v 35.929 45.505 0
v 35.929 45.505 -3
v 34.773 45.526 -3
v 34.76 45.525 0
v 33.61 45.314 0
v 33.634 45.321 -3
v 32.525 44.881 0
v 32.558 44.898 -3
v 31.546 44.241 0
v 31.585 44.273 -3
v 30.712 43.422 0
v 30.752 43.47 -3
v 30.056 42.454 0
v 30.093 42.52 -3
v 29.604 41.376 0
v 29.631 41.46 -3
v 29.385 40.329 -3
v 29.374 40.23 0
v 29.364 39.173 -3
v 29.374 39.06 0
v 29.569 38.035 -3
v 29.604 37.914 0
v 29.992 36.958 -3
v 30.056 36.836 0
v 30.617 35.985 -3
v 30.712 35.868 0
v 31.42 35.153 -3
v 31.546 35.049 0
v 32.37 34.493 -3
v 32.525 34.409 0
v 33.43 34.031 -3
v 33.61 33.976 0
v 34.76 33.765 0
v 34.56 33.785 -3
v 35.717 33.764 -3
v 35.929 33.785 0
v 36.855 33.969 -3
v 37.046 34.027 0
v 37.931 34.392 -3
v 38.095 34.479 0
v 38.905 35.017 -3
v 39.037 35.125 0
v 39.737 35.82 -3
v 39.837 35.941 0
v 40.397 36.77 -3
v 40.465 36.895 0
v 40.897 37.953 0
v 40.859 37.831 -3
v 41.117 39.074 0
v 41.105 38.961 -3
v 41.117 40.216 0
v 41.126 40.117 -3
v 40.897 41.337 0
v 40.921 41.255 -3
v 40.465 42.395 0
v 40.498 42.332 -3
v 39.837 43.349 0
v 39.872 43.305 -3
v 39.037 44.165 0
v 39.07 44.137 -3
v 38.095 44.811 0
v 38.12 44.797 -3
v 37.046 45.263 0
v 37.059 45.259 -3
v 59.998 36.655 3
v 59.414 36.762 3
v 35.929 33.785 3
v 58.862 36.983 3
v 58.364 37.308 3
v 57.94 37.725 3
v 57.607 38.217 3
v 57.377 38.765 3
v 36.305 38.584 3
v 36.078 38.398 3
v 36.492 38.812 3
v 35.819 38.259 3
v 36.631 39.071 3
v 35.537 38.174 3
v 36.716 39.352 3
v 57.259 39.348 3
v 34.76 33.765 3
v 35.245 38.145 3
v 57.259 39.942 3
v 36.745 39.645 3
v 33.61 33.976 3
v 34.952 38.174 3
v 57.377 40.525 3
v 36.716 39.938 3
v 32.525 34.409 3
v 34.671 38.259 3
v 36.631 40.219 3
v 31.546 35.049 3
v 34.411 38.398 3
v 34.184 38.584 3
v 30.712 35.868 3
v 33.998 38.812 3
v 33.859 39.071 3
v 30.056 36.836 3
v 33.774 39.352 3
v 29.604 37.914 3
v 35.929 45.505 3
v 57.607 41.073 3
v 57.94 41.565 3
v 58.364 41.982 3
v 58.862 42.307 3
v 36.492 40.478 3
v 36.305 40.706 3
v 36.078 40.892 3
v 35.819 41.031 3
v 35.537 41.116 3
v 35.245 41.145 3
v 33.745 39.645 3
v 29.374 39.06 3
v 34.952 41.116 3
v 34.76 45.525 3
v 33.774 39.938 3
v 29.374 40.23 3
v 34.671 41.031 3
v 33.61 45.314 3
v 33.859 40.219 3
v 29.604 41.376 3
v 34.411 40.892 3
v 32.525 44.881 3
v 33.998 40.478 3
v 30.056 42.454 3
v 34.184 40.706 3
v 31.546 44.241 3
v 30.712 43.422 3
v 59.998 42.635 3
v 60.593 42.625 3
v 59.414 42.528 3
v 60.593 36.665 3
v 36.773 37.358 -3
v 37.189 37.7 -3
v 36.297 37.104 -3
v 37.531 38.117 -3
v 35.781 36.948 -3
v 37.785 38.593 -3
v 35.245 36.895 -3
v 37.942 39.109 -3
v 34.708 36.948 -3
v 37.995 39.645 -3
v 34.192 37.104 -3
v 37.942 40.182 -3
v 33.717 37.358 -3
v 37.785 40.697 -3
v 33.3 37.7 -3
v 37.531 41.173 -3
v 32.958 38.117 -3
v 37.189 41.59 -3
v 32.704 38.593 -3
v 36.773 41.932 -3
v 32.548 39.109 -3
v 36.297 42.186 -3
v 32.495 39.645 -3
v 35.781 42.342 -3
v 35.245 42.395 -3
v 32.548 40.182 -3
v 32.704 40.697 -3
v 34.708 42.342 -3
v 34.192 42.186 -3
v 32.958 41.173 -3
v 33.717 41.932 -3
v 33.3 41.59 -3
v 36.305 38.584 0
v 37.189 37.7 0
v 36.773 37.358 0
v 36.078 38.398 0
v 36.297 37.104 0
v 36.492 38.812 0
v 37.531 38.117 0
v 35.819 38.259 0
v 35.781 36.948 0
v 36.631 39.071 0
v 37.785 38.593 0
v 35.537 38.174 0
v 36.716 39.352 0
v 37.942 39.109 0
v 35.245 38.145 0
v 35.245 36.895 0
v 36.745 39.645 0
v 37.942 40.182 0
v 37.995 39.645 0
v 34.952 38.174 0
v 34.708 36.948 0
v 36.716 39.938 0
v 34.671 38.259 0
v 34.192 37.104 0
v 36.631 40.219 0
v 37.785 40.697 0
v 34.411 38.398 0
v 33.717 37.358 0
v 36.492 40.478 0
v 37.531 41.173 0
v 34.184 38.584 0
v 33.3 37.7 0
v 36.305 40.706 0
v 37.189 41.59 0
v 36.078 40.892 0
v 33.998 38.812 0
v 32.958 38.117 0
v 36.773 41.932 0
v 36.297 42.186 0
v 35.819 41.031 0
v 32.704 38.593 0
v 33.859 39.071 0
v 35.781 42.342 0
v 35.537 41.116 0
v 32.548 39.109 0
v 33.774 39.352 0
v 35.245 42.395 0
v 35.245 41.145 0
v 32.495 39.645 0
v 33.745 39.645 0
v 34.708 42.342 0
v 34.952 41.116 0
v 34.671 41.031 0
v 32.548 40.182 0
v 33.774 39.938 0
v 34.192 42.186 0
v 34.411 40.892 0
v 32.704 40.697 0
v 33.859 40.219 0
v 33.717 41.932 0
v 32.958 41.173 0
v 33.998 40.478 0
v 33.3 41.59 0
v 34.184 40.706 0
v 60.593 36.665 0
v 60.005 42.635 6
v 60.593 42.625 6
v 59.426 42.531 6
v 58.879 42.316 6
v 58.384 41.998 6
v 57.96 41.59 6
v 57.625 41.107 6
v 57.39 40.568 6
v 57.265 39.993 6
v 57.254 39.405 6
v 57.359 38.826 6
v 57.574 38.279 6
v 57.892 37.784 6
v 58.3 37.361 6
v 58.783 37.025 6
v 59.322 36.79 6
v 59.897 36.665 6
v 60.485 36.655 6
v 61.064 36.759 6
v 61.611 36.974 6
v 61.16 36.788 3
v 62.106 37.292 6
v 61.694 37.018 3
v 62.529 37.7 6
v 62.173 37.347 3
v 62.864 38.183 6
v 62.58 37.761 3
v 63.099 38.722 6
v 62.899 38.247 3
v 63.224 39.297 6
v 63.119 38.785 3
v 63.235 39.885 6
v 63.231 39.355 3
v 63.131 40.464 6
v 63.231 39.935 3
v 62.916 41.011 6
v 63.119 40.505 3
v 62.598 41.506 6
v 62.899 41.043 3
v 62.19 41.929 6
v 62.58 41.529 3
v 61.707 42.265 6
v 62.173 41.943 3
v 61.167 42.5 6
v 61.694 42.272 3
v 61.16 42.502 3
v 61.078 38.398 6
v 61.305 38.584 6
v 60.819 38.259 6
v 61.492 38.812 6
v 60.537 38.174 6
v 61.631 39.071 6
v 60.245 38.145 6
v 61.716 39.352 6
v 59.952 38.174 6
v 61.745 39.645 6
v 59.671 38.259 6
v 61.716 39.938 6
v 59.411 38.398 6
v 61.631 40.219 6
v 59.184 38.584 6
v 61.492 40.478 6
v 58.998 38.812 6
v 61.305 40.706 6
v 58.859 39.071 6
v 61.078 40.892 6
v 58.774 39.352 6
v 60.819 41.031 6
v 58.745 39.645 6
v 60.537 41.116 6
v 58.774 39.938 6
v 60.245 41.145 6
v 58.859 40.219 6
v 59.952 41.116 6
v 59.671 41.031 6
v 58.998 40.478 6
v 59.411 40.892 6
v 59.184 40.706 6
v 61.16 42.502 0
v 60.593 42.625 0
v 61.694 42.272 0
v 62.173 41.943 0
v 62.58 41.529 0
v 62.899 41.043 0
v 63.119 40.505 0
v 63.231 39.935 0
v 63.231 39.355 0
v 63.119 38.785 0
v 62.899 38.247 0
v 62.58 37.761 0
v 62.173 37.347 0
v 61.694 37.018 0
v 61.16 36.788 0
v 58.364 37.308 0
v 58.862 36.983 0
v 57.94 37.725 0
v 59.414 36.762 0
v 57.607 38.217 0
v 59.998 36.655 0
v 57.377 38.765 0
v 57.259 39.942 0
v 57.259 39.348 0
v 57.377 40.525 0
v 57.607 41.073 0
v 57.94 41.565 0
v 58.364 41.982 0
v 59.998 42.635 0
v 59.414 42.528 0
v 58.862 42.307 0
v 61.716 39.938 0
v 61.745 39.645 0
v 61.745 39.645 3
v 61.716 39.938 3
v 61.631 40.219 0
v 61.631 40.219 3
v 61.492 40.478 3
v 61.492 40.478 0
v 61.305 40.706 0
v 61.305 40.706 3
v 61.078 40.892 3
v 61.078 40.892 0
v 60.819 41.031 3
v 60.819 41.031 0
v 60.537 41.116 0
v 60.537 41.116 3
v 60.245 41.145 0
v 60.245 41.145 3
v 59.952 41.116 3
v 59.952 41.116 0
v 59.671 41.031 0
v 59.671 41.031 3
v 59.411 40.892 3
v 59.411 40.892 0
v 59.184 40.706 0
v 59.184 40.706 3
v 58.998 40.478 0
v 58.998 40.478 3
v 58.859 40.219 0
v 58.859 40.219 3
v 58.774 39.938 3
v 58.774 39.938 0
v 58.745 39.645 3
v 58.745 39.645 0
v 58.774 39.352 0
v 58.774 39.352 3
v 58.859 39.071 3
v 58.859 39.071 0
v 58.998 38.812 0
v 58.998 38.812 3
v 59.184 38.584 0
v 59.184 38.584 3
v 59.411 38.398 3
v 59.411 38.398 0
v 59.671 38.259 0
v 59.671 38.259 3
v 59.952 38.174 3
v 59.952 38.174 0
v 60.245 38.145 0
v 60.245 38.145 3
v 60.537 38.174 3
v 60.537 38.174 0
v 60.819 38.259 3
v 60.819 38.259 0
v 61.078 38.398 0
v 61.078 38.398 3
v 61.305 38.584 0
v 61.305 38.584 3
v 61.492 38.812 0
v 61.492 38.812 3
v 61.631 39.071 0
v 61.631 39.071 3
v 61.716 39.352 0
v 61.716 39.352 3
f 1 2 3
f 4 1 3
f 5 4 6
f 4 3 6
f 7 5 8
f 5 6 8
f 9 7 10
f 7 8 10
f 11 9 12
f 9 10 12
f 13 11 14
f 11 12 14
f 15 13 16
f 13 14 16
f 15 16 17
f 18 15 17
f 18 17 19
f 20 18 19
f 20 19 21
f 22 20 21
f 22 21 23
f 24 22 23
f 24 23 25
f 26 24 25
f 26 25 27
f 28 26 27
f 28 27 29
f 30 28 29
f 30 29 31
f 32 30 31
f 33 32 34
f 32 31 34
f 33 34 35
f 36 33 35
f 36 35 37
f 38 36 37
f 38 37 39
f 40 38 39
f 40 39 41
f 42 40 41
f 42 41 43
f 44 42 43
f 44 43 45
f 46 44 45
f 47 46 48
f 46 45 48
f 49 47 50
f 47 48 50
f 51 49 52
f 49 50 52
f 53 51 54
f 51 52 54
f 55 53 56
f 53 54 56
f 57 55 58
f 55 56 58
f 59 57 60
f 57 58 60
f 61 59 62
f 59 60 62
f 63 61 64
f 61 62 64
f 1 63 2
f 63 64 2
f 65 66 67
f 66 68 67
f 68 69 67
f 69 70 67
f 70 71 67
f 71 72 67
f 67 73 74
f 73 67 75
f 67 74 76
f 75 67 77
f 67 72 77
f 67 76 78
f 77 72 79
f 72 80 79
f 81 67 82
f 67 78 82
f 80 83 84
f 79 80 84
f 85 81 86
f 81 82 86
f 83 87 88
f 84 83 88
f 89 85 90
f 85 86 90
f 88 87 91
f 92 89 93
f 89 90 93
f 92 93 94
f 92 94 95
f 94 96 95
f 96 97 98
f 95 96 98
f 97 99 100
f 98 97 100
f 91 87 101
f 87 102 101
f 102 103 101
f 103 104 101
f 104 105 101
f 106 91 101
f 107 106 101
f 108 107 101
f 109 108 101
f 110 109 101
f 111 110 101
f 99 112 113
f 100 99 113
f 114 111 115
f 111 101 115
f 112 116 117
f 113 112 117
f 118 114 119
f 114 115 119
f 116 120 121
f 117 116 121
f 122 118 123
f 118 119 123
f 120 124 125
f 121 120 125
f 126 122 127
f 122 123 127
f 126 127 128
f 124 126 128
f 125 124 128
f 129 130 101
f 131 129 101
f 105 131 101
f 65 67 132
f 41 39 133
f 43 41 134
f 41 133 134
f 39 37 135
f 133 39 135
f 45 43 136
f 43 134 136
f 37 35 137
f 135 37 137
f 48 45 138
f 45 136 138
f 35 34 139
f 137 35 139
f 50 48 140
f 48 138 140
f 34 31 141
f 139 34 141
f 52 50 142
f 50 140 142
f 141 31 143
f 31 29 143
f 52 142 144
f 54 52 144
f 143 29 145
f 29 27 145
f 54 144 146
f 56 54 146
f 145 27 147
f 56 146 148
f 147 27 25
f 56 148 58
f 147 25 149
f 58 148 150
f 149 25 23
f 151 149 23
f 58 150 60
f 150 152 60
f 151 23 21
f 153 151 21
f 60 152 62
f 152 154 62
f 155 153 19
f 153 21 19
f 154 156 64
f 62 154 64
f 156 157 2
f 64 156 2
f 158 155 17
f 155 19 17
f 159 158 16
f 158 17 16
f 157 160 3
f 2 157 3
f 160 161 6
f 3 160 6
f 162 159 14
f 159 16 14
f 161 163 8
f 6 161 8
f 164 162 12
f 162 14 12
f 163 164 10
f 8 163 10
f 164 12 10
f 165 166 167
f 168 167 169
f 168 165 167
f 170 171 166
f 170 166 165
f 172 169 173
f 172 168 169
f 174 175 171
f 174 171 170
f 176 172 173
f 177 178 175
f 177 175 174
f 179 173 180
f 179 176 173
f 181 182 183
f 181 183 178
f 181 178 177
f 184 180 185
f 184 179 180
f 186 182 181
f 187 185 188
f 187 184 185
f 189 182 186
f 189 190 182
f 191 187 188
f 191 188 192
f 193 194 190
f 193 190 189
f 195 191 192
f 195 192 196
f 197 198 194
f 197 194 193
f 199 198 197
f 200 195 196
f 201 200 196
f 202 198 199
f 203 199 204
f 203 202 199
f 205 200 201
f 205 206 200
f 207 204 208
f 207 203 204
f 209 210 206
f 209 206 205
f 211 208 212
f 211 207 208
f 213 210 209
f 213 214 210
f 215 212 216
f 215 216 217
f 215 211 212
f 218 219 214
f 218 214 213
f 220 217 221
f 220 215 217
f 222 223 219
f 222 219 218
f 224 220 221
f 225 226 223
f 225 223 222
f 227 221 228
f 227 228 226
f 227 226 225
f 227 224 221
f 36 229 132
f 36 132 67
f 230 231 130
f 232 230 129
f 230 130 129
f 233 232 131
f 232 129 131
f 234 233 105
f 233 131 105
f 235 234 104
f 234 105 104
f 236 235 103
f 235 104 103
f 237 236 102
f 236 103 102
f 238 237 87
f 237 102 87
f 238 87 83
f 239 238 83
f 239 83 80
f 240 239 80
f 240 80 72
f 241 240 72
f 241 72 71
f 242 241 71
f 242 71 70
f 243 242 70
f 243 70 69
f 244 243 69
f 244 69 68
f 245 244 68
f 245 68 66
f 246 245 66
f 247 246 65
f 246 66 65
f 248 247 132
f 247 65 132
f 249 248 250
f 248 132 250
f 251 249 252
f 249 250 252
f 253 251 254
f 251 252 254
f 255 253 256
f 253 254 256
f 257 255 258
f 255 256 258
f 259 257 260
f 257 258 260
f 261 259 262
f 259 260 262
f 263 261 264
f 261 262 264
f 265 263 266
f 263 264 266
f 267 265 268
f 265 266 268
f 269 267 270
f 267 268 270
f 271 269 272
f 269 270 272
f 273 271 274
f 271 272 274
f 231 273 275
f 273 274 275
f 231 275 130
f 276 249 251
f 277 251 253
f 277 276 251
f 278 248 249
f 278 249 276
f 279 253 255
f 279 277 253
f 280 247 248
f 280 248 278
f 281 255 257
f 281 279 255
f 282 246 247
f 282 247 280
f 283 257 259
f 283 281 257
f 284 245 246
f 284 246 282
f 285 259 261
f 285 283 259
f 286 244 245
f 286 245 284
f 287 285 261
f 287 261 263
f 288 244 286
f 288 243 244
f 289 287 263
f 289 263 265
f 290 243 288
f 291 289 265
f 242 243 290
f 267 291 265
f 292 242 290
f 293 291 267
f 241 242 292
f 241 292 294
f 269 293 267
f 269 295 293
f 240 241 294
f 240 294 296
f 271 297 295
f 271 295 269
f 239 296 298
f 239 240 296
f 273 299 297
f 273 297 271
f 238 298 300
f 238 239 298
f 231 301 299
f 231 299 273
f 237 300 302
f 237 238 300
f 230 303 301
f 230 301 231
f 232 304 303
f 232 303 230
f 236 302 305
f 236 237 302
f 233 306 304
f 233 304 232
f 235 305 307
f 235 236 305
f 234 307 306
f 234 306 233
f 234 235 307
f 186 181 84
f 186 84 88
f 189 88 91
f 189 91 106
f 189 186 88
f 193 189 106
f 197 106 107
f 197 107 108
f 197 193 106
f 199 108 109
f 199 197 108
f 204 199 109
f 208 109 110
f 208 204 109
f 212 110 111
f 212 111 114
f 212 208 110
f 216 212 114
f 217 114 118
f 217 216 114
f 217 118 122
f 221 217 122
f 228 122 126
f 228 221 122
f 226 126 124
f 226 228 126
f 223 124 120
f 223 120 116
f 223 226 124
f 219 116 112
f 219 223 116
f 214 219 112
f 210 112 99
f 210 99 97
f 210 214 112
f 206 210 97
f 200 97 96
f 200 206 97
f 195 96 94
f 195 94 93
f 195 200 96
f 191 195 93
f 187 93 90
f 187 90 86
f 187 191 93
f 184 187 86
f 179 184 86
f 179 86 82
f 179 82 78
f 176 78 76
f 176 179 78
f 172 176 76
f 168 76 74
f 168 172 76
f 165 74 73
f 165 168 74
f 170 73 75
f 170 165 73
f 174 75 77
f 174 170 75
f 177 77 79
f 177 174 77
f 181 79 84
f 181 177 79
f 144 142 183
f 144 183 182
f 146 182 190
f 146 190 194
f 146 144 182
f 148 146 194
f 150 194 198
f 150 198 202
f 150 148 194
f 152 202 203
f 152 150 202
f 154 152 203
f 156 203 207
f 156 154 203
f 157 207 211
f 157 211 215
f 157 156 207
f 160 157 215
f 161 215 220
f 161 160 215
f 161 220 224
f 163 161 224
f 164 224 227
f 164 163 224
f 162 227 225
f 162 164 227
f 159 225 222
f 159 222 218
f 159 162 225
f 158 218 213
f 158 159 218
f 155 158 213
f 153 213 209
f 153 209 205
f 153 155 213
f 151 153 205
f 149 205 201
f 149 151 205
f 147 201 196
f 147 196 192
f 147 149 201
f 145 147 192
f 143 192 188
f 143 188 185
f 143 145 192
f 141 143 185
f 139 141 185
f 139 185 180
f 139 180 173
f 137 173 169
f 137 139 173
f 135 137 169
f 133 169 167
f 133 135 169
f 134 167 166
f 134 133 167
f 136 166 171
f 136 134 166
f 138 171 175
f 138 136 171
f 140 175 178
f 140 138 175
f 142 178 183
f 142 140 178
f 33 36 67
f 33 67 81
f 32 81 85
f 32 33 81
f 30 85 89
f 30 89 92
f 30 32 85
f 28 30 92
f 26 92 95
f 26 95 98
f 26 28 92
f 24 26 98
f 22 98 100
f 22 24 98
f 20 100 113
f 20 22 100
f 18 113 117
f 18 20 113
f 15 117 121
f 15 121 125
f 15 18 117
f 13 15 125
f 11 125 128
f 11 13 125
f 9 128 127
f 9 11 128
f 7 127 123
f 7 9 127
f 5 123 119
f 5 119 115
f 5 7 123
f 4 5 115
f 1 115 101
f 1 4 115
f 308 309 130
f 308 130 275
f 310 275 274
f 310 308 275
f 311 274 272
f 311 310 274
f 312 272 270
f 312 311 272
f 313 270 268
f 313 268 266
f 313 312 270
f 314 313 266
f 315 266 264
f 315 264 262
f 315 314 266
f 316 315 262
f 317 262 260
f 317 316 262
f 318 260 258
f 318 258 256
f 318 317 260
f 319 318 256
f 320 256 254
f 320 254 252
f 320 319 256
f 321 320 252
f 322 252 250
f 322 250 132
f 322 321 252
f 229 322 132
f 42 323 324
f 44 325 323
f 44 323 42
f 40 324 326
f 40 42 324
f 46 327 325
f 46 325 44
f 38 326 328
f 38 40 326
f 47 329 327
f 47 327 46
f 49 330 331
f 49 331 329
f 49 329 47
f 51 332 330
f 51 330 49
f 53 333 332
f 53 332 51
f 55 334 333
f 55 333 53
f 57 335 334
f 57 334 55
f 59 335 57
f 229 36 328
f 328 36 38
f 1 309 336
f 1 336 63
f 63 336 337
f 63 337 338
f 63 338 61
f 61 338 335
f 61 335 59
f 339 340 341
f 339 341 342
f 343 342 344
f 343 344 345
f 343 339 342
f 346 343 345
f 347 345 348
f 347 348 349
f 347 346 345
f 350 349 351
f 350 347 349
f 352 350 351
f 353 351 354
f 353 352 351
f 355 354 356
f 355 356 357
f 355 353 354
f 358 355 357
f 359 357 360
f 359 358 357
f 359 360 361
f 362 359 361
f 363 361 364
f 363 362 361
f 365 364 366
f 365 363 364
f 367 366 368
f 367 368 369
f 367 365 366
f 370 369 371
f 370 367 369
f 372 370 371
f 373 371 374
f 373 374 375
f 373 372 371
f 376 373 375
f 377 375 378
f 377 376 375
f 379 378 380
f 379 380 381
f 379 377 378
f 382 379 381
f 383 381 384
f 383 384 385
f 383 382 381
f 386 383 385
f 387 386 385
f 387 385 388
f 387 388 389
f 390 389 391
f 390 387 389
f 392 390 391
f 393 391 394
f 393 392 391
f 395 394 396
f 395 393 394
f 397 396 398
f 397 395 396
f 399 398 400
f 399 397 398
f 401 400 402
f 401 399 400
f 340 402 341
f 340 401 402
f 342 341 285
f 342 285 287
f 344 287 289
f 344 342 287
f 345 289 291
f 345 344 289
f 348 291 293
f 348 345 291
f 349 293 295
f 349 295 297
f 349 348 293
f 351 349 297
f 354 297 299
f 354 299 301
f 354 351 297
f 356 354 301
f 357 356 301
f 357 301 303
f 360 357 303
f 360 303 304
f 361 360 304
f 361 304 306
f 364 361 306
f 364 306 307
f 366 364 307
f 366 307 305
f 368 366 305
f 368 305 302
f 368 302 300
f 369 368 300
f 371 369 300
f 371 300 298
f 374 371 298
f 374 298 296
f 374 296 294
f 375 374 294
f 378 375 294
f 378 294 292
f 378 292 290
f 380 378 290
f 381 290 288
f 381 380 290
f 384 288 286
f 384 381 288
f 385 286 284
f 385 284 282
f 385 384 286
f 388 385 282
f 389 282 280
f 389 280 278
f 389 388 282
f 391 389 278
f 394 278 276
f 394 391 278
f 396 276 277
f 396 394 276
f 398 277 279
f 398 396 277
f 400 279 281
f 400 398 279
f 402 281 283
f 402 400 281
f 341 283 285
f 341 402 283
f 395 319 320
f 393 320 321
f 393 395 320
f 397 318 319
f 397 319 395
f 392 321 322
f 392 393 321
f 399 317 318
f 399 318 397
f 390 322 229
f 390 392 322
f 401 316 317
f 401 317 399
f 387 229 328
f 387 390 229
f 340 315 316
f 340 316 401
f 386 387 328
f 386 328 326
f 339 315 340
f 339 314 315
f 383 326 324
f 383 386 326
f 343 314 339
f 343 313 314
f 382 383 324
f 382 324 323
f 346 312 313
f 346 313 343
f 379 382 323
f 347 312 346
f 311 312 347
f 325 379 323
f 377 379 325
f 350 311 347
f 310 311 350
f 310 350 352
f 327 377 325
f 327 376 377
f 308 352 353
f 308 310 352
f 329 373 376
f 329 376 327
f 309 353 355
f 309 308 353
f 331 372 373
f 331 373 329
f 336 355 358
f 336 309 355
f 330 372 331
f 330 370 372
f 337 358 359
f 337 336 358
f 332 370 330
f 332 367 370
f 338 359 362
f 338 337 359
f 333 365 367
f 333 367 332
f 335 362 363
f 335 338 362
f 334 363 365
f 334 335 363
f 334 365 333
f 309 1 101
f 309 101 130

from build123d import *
from build123d.topology import SkipClean

# Parameters (mm, degrees)
CORTE_R                 = 1.5
SALIENTE_EXTRUIR1_DEPTH = 3
SALIENTE_EXTRUIR2_START = -3
EXT1_R                  = 5.9
EXT1_R_2                = 2.75
SALIENTE_EXTRUIR2_DEPTH = 3
EXT2_R                  = 3
EXT2_R_2                = 1.5
SALIENTE_EXTRUIR3_DEPTH = 6


with BuildPart() as part:
    # Corte → Saliente-Extruir1 (new body)
    with BuildSketch(Plane.XY):
        with BuildLine():
            Line((35.929130783, 45.505192832), (60.592730783, 42.624770113))
            ThreePointArc((60.592730783, 42.624770113), (63.244730783, 39.645022473), (60.592730783, 36.665274833))
            Line((60.592730783, 36.665274833), (35.929130783, 33.784852114))
            ThreePointArc((35.929130783, 33.784852114), (29.344730783, 39.645022473), (35.929130783, 45.505192832))
        make_face()
        with Locations((35.244730783, 39.645022473)):
            Circle(CORTE_R, mode=Mode.SUBTRACT)
        with Locations((60.244730783, 39.645022473)):
            Circle(CORTE_R, mode=Mode.SUBTRACT)
    extrude(amount=SALIENTE_EXTRUIR1_DEPTH)

    # Ext1 → Saliente-Extruir2 (add)
    with SkipClean():  # the faces are left unmerged after this step: merging them gives an invalid solid
        with BuildSketch(Plane.XY.offset(SALIENTE_EXTRUIR2_START)):
            with Locations(Location((35.244730783, 39.645022473, 0), (0, 0, 83.338693133))):
                Circle(EXT1_R)
            with Locations((35.244730783, 39.645022473)):
                Circle(EXT1_R_2, mode=Mode.SUBTRACT)
        extrude(amount=SALIENTE_EXTRUIR2_DEPTH)

    # Ext2 → Saliente-Extruir3 (add)
    with SkipClean():  # the faces are left unmerged after this step: merging them gives an invalid solid
        with BuildSketch(Plane.XY):
            with Locations(Location((60.244730783, 39.645022473, 0), (0, 0, 83.338693133))):
                Circle(EXT2_R)
            with Locations((60.244730783, 39.645022473)):
                Circle(EXT2_R_2, mode=Mode.SUBTRACT)
        extrude(amount=SALIENTE_EXTRUIR3_DEPTH)


solid = part.part
